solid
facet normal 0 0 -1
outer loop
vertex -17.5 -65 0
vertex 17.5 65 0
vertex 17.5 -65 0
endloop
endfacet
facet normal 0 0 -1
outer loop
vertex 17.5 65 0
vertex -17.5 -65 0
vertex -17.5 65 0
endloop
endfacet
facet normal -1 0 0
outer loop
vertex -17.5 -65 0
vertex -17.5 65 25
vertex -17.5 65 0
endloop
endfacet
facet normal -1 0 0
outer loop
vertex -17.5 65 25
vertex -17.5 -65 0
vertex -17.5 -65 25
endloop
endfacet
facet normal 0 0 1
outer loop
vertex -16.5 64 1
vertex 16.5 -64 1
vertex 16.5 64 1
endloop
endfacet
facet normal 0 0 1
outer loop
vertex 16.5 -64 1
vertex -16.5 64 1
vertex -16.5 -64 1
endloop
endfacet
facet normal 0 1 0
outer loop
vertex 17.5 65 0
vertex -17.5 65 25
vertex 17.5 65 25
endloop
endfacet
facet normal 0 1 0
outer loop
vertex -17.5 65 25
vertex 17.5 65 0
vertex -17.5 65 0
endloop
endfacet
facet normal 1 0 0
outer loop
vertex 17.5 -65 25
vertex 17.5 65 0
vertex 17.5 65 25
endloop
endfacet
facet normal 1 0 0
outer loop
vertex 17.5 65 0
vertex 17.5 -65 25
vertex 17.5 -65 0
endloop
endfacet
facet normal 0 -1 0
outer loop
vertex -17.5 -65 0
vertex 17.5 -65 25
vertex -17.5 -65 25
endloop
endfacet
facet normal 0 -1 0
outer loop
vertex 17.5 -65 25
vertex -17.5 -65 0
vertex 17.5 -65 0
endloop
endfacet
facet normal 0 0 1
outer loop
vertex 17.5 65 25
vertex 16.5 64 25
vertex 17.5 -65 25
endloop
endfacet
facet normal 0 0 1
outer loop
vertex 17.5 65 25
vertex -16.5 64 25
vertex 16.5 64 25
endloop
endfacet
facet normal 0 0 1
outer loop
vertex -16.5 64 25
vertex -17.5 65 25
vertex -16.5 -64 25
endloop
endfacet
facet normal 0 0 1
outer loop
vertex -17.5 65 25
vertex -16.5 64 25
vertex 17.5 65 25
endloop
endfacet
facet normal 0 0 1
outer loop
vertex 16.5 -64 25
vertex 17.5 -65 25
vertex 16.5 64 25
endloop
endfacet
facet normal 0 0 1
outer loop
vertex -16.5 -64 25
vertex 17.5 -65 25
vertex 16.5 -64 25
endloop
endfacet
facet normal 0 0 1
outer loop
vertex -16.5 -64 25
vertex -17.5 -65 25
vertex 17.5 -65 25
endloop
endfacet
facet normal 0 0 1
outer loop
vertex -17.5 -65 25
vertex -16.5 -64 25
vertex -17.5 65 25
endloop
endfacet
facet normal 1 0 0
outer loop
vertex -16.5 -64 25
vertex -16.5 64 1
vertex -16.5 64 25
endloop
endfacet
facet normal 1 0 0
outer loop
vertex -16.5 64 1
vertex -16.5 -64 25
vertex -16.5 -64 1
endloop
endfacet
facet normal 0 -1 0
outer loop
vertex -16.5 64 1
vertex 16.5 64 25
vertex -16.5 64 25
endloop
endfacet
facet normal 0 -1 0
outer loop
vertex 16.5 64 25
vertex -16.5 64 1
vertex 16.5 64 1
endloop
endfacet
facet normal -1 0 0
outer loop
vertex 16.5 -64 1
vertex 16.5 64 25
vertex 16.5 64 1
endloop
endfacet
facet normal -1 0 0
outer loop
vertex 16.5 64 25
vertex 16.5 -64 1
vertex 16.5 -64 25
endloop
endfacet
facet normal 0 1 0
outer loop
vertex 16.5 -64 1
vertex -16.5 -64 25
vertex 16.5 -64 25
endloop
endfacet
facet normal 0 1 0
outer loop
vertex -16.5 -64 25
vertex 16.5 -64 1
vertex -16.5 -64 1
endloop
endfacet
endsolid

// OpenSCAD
//This is tool drawer insert
//It is a rectangular box with an optional sloping inner edge on the front or all-round.
outer_height = 25;
outer_width = 35;
outer_length = 130;
wall_thickness = 1;
inner_ramps = "none"; //[none:no ramps,front:front ramp only,all:ramps on all sides]

drawer_insert();

module drawer_insert()
{
    //Print the base 
    linear_extrude(height=wall_thickness)
        square([outer_width, outer_length], center=true);
    //create the wall outer 
    linear_extrude(height=outer_height)
        polygon(
            points=[
                [-1*outer_width/2, -1*outer_length/2],
                [-1*outer_width/2, +1*outer_length/2],
                [+1*outer_width/2, +1*outer_length/2],
                [+1*outer_width/2, -1*outer_length/2],
                [-1*(outer_width/2-wall_thickness), -1*(outer_length/2-wall_thickness)],
                [-1*(outer_width/2-wall_thickness), +1*(outer_length/2-wall_thickness)],
                [+1*(outer_width/2-wall_thickness), +1*(outer_length/2-wall_thickness)],
                [+1*(outer_width/2-wall_thickness), -1*(outer_length/2-wall_thickness)],
            ], 
            paths=[
                [0,1,2,3],
                [4,5,6,7]
            ]
        );
    //Make the inside curve arc
    unit_arc=[
        [1,1],
        [cos(0),sin(0)],
        [cos(5),sin(5)],
        [cos(10),sin(10)],
        [cos(15),sin(15)],
        [cos(20),sin(20)],
        [cos(25),sin(25)],
        [cos(30),sin(30)],
        [cos(35),sin(35)],
        [cos(40),sin(40)],
        [cos(45),sin(45)],
        [cos(50),sin(50)],
        [cos(55),sin(55)],
        [cos(60),sin(60)],
        [cos(65),sin(65)],
        [cos(70),sin(70)],
        [cos(75),sin(75)],
        [cos(80),sin(80)],
        [cos(85),sin(85)],
        [cos(90),sin(90)],
    ];
    if ((inner_ramps == "front")||(inner_ramps=="all"))
    {
        //Scale for the front
        arc_radius = outer_height;
        if (outer_length < outer_height)
        {
            arc_radius = outer_length;
        }
        scaled_arc = unit_arc * arc_radius;
        //
        translate([0,-1* (outer_length/2 - arc_radius-wall_thickness),outer_height])
        rotate([-90,90,90])
        linear_extrude(height=outer_width, center=true)
            polygon(scaled_arc);
    }
    if (inner_ramps=="all")
    {
        //Scale for the rear
        arc_radius = outer_height;
        if (outer_length < outer_height)
        {
            arc_radius = outer_length;
        }
        scaled_arc = unit_arc * arc_radius;
        //
        translate([0,+1* (outer_length/2 - arc_radius-wall_thickness),outer_height])
        rotate([+90,90,90])
        linear_extrude(height=outer_width, center=true)
            polygon(scaled_arc);
        //Scale for the left
        arc_radius = outer_height;
        if (outer_width < outer_height)
        {
            arc_radius = outer_width;
        }
        scaled_arc = unit_arc * arc_radius;
        //
        translate([+1* (outer_width/2 - arc_radius-wall_thickness),0,outer_height])
        rotate([+90,90,0])
        linear_extrude(height=outer_length, center=true)
            polygon(scaled_arc);
       //Scale for the right
        arc_radius = outer_height;
        if (outer_width < outer_height)
        {
            arc_radius = outer_width;
        }
        scaled_arc = unit_arc * arc_radius;
        //
        translate([-1* (outer_width/2 - arc_radius-wall_thickness),0,outer_height])
        rotate([+90,90,180])
        linear_extrude(height=outer_length, center=true)
            polygon(scaled_arc);
    }
       
}
